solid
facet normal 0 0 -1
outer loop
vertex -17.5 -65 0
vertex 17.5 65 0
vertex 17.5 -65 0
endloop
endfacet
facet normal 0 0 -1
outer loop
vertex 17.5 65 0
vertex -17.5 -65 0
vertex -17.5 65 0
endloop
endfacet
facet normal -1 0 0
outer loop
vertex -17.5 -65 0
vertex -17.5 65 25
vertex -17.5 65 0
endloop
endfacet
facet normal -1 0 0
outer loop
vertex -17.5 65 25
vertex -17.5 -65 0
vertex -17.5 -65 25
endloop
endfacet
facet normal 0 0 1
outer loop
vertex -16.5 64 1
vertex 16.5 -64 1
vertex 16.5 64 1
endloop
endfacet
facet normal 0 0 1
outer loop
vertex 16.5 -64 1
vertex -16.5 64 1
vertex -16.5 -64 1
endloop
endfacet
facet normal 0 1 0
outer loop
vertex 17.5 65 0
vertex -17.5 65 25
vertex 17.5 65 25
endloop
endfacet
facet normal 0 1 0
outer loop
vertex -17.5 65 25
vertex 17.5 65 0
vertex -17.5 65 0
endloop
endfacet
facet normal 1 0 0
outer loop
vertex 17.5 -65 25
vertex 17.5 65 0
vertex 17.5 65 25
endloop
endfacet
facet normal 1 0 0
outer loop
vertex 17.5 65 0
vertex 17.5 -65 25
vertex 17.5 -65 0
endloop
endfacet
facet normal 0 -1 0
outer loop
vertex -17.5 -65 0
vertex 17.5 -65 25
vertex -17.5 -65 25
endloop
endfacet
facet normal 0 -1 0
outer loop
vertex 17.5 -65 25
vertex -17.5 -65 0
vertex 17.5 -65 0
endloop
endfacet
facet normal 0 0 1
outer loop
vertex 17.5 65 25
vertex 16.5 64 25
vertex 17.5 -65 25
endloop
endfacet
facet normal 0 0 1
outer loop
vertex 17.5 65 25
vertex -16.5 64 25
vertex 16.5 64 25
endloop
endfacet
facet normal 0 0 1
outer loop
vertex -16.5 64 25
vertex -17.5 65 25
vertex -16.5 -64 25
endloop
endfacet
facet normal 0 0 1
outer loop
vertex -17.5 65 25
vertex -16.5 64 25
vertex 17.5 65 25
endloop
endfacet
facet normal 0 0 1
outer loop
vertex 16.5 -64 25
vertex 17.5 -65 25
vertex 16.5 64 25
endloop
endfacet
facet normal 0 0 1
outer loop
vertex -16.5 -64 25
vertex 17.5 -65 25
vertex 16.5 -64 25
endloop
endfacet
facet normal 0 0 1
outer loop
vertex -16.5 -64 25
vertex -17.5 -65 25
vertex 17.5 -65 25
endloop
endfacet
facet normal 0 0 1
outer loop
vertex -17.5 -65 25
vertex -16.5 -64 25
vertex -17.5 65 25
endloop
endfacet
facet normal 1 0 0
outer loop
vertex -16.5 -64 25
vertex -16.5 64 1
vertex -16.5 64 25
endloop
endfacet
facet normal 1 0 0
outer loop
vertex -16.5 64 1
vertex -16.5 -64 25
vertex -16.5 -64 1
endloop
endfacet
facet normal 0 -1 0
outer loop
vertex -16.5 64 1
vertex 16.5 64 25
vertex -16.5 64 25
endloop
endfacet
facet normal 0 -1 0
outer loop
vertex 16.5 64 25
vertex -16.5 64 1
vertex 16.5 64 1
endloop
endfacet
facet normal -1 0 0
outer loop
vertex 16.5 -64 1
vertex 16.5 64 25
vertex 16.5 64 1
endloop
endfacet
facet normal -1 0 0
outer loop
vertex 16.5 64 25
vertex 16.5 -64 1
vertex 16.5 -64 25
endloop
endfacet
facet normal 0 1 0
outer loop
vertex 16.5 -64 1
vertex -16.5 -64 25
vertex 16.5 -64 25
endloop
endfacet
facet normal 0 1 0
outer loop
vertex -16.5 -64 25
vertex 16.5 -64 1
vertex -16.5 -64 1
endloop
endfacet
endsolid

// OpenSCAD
//This is tool drawer insert
//It is a rectangular box with an optional sloping inner edge on the front or all-round.
outer_height = 25;
outer_width = 35;
outer_length = 130;
wall_thickness = 1;
inner_ramps = "none"; //[none:no ramps,front:front ramp only,all:ramps on all sides]

drawer_insert();

module drawer_insert()
{
    //Print the base 
    linear_extrude(height=wall_thickness)
        square([outer_width, outer_length], center=true);
    //create the wall outer 
    linear_extrude(height=outer_height)
        polygon(
            points=[
                [-1*outer_width/2, -1*outer_length/2],
                [-1*outer_width/2, +1*outer_length/2],
                [+1*outer_width/2, +1*outer_length/2],
                [+1*outer_width/2, -1*outer_length/2],
                [-1*(outer_width/2-wall_thickness), -1*(outer_length/2-wall_thickness)],
                [-1*(outer_width/2-wall_thickness), +1*(outer_length/2-wall_thickness)],
                [+1*(outer_width/2-wall_thickness), +1*(outer_length/2-wall_thickness)],
                [+1*(outer_width/2-wall_thickness), -1*(outer_length/2-wall_thickness)],
            ], 
            paths=[
                [0,1,2,3],
                [4,5,6,7]
            ]
        );
    //Make the inside curve arc
    unit_arc=[
        [1,1],
        [cos(0),sin(0)],
        [cos(5),sin(5)],
        [cos(10),sin(10)],
        [cos(15),sin(15)],
        [cos(20),sin(20)],
        [cos(25),sin(25)],
        [cos(30),sin(30)],
        [cos(35),sin(35)],
        [cos(40),sin(40)],
        [cos(45),sin(45)],
        [cos(50),sin(50)],
        [cos(55),sin(55)],
        [cos(60),sin(60)],
        [cos(65),sin(65)],
        [cos(70),sin(70)],
        [cos(75),sin(75)],
        [cos(80),sin(80)],
        [cos(85),sin(85)],
        [cos(90),sin(90)],
    ];
    if ((inner_ramps == "front")||(inner_ramps=="all"))
    {
        //Scale for the front
        arc_radius = outer_height;
        if (outer_length < outer_height)
        {
            arc_radius = outer_length;
        }
        scaled_arc = unit_arc * arc_radius;
        //
        translate([0,-1* (outer_length/2 - arc_radius-wall_thickness),outer_height])
        rotate([-90,90,90])
        linear_extrude(height=outer_width, center=true)
            polygon(scaled_arc);
    }
    if (inner_ramps=="all")
    {
        //Scale for the rear
        arc_radius = outer_height;
        if (outer_length < outer_height)
        {
            arc_radius = outer_length;
        }
        scaled_arc = unit_arc * arc_radius;
        //
        translate([0,+1* (outer_length/2 - arc_radius-wall_thickness),outer_height])
        rotate([+90,90,90])
        linear_extrude(height=outer_width, center=true)
            polygon(scaled_arc);
        //Scale for the left
        arc_radius = outer_height;
        if (outer_width < outer_height)
        {
            arc_radius = outer_width;
        }
        scaled_arc = unit_arc * arc_radius;
        //
        translate([+1* (outer_width/2 - arc_radius-wall_thickness),0,outer_height])
        rotate([+90,90,0])
        linear_extrude(height=outer_length, center=true)
            polygon(scaled_arc);
       //Scale for the right
        arc_radius = outer_height;
        if (outer_width < outer_height)
        {
            arc_radius = outer_width;
        }
        scaled_arc = unit_arc * arc_radius;
        //
        translate([-1* (outer_width/2 - arc_radius-wall_thickness),0,outer_height])
        rotate([+90,90,180])
        linear_extrude(height=outer_length, center=true)
            polygon(scaled_arc);
    }
       
}
